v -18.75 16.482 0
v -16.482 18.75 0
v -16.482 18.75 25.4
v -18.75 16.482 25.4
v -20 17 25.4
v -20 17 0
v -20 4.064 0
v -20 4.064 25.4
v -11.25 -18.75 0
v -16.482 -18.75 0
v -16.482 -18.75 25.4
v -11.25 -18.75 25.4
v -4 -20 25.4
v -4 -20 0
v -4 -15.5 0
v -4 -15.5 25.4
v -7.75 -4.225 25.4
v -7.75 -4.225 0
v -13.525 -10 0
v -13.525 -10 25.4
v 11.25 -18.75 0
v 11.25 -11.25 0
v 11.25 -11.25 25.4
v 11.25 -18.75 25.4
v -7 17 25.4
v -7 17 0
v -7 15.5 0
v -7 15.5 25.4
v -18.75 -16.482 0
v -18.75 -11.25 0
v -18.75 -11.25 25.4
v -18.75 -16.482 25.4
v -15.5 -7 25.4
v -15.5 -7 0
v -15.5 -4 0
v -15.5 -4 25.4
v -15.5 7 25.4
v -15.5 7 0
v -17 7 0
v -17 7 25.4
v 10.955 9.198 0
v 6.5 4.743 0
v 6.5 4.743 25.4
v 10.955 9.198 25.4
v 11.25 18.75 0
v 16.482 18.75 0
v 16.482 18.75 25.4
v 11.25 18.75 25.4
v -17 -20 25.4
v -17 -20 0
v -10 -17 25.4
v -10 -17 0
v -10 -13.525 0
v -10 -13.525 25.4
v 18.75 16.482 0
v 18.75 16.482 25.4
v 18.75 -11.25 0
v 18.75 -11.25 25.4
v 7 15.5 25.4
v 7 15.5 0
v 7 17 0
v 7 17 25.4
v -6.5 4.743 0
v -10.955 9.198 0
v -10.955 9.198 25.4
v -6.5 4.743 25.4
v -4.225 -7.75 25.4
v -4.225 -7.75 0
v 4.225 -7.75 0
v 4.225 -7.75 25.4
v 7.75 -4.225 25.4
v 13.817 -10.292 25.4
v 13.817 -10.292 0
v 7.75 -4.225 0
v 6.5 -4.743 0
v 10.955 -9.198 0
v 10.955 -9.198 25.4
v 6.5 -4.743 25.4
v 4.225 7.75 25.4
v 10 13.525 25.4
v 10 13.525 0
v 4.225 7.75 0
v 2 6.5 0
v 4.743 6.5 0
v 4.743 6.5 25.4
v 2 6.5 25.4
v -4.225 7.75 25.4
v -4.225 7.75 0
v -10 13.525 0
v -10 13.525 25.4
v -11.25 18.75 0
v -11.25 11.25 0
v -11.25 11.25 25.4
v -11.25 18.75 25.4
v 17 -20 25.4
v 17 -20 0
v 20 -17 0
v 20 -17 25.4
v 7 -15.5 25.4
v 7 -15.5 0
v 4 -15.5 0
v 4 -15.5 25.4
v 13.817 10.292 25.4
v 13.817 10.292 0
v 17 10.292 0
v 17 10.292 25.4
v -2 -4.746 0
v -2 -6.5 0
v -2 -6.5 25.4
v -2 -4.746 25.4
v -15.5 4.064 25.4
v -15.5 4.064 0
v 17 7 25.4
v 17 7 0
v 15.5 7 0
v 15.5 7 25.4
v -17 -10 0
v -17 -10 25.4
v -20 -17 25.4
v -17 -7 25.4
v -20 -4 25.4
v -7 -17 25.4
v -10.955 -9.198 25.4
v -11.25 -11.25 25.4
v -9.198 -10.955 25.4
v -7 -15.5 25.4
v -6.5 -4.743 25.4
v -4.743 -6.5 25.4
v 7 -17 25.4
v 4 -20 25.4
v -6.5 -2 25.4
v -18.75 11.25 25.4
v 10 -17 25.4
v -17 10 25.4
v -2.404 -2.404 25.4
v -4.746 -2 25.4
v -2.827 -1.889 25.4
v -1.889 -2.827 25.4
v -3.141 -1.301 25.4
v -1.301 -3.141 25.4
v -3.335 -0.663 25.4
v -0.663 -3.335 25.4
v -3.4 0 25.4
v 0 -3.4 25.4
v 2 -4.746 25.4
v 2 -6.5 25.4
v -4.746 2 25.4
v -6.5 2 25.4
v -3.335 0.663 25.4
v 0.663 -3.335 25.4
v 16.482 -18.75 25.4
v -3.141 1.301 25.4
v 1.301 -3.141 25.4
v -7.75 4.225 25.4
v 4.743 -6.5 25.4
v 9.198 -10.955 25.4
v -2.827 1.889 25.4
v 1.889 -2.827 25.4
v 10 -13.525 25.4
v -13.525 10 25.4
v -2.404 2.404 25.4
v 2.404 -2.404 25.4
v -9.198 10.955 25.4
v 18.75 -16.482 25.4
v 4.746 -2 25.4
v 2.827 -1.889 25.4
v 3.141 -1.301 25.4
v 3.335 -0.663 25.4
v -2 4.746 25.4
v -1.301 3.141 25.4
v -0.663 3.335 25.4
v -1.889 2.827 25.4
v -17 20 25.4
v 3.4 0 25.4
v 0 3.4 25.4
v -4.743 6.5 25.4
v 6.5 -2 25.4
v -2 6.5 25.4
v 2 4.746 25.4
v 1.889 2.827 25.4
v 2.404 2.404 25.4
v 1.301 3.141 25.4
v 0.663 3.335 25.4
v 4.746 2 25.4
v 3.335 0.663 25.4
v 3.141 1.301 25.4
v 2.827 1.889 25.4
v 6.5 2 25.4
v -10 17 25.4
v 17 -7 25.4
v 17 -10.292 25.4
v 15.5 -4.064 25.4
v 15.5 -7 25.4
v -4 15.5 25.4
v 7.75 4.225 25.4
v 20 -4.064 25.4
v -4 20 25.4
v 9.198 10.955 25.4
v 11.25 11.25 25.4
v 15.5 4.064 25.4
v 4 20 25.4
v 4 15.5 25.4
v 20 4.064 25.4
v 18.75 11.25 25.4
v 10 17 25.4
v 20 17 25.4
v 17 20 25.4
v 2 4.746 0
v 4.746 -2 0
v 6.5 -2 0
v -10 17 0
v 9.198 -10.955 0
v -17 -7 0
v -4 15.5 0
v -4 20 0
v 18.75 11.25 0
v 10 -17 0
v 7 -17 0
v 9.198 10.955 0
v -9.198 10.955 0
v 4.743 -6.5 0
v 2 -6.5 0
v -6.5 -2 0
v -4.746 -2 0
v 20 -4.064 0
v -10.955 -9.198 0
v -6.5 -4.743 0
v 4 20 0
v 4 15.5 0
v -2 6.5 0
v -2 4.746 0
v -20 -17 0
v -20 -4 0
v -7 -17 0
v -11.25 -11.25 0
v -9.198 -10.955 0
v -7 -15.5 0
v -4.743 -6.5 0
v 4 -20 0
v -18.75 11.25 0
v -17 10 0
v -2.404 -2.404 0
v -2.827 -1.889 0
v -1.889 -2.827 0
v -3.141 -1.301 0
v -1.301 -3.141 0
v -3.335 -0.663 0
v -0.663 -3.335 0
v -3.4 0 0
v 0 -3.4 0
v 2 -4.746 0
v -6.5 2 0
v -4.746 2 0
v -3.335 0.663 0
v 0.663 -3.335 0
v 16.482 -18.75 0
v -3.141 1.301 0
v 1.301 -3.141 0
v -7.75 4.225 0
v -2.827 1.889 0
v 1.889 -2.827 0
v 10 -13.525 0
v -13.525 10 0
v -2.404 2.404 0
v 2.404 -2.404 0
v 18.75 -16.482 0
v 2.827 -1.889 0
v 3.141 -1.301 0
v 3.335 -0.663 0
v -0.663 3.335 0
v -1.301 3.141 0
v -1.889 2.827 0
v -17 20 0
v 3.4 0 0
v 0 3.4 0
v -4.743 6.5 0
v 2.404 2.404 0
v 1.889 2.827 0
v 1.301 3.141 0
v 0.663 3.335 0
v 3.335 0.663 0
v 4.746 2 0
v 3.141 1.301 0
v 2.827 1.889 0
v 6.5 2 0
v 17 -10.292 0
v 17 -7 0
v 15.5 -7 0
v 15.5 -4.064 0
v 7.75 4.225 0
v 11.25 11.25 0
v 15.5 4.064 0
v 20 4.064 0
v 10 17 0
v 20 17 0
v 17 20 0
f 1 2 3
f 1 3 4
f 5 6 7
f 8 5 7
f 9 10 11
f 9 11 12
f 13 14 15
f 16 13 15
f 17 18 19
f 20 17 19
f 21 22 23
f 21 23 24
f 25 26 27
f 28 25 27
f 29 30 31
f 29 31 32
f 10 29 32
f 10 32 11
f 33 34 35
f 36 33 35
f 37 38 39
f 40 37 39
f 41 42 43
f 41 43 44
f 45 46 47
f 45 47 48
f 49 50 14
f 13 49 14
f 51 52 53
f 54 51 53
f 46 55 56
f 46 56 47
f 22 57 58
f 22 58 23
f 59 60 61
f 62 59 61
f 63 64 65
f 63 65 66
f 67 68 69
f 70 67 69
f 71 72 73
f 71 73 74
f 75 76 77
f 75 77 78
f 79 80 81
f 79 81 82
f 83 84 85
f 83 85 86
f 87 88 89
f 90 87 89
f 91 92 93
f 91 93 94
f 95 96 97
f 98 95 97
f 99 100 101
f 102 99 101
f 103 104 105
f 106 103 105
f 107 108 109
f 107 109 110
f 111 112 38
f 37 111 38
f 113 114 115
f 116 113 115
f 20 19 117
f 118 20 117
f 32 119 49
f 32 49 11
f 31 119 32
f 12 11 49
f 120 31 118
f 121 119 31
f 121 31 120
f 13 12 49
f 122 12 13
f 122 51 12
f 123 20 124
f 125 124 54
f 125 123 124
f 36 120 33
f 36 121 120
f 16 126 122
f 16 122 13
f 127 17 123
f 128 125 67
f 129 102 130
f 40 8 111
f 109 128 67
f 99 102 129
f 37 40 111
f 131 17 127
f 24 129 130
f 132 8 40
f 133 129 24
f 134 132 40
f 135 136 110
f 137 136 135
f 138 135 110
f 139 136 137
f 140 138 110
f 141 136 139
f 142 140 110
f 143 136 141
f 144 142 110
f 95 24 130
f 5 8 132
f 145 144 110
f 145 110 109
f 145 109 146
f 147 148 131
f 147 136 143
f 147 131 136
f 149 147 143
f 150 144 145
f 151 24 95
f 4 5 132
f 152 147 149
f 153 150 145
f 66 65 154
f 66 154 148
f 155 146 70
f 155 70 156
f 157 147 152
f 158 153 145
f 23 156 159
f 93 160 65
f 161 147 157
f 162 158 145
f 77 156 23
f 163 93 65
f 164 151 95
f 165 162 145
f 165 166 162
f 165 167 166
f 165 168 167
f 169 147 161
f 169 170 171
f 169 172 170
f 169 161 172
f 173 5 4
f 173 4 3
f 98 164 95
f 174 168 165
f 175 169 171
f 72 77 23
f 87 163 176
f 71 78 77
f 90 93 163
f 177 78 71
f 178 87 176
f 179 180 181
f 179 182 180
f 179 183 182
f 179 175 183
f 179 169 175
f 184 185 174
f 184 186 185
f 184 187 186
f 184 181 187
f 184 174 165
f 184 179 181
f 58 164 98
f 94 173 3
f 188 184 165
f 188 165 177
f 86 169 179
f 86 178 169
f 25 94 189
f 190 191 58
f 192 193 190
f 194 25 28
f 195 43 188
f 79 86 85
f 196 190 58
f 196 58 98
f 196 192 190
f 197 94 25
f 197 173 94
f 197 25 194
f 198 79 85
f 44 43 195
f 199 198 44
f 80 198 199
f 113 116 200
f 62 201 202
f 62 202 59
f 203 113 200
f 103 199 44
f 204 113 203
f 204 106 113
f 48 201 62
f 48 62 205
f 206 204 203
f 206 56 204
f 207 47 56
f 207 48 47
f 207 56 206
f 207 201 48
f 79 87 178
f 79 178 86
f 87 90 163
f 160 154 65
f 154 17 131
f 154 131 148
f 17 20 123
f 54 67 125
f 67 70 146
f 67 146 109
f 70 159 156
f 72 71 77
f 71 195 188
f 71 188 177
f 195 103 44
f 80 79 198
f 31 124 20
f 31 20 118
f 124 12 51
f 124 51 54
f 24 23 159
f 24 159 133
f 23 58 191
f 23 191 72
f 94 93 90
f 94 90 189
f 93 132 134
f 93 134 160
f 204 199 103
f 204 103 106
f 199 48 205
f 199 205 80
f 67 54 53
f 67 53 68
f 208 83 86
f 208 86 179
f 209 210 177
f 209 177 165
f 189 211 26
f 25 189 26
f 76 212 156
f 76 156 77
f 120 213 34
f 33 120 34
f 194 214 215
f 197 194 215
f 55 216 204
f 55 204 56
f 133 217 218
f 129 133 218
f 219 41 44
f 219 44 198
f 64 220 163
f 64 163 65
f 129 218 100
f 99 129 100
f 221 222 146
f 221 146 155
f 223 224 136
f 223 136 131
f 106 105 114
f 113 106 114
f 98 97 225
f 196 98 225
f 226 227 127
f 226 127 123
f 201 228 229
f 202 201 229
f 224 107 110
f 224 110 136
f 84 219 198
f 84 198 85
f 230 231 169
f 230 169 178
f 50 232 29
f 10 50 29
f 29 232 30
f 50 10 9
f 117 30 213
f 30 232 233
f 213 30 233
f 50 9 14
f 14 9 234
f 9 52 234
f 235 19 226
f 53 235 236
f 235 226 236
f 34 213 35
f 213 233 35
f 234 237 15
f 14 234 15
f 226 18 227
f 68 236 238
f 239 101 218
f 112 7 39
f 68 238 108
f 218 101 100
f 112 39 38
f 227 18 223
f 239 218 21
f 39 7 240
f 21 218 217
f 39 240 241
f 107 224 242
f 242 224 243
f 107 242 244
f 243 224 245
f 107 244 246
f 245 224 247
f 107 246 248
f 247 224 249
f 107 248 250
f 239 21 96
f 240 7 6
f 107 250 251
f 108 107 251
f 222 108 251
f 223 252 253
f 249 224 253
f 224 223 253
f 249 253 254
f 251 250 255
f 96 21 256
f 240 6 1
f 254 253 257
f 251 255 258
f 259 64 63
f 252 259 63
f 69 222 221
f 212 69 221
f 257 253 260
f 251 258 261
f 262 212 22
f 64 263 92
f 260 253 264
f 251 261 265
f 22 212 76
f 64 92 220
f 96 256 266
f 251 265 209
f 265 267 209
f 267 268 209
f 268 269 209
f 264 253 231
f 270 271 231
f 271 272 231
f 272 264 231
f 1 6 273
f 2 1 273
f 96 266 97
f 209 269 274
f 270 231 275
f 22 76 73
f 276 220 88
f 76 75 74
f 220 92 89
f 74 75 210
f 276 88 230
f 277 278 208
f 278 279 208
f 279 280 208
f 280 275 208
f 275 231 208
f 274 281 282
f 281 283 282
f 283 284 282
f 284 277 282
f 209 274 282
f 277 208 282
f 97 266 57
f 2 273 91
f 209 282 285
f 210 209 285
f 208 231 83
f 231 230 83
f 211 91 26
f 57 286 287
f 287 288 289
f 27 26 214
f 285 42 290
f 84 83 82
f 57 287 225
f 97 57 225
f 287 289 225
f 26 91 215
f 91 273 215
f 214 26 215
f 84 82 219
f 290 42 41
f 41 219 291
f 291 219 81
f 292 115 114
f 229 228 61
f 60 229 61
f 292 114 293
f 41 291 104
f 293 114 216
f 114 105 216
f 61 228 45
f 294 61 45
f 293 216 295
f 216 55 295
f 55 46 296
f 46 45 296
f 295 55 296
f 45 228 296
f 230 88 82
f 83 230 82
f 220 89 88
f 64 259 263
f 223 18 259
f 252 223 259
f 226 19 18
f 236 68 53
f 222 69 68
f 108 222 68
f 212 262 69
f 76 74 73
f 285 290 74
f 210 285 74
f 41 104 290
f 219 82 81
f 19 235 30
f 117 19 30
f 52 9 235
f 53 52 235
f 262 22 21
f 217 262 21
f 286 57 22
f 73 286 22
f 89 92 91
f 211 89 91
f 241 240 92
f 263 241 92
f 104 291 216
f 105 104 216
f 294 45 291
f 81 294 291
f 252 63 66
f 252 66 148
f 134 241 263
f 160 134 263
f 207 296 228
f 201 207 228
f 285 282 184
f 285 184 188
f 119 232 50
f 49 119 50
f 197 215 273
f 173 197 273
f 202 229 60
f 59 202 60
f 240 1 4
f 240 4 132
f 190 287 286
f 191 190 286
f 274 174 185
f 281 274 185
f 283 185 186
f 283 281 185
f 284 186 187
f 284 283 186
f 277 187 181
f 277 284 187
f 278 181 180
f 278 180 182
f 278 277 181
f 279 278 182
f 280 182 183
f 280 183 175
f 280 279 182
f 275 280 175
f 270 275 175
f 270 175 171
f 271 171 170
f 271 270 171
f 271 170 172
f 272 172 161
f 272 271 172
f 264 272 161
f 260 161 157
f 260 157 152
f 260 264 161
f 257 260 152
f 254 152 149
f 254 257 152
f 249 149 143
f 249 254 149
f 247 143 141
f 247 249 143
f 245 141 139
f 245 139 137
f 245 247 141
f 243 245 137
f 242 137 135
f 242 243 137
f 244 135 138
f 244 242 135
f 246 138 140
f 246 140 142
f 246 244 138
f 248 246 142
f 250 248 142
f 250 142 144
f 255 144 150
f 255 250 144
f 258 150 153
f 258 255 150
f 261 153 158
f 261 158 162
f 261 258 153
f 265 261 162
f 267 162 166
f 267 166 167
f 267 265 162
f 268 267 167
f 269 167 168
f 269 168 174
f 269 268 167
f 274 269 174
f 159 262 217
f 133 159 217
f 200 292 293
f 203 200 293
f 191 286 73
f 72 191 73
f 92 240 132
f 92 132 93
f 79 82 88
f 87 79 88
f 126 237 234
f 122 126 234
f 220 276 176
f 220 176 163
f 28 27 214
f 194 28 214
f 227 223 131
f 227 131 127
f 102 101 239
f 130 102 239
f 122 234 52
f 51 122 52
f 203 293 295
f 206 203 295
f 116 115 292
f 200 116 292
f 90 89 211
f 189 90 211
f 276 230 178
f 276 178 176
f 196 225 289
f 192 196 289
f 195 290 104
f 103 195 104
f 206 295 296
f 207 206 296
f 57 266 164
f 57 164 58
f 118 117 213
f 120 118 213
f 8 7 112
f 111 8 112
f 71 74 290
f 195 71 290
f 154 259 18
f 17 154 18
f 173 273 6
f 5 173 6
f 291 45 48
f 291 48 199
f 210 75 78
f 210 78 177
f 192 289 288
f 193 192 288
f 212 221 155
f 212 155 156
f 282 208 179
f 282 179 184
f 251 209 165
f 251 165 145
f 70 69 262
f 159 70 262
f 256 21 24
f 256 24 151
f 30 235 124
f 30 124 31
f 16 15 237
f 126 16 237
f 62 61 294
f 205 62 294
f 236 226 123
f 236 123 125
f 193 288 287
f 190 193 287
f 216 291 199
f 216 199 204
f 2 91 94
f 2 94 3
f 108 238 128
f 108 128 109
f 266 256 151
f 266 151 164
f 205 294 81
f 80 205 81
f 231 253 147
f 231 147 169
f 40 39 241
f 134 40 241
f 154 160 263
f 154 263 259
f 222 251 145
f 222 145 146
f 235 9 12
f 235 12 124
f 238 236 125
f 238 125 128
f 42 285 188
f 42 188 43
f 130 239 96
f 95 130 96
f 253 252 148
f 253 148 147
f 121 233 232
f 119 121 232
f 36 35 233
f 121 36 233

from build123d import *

# Parameters (mm, degrees)
SKETCH1_R      = 3.4
EXTRUDE1_DEPTH = 25.4


with BuildPart() as part:
    # Sketch1 → Extrude1 (new body)
    with BuildSketch(Plane.XY):
        Polygon((4.225, 7.75), (-4.225, 7.75), (-10, 13.525), (-10, 17), (-7, 17), (-7, 15.5), (-4, 15.5), (-4, 20), (-17, 20), (-20, 17), (-20, 4.0635), (-15.5, 4.0635), (-15.5, 7), (-17, 7), (-17, 10), (-13.525, 10), (-7.75, 4.225), (-7.75, -4.225), (-13.525, -10), (-17, -10), (-17, -7), (-15.5, -7), (-15.5, -4), (-20, -4), (-20, -17), (-17, -20), (-4, -20), (-4, -15.5), (-7, -15.5), (-7, -17), (-10, -17), (-10, -13.525), (-4.225, -7.75), (4.225, -7.75), (10, -13.525), (10, -17), (7, -17), (7, -15.5), (4, -15.5), (4, -20), (17, -20), (20, -17), (20, -4.0635), (15.5, -4.0635), (15.5, -7), (17, -7), (17, -10.2921), (13.8171, -10.2921), (7.75, -4.225), (7.75, 4.225), (13.8171, 10.2921), (17, 10.2921), (17, 7), (15.5, 7), (15.5, 4.0635), (20, 4.0635), (20, 17), (17, 20), (4, 20), (4, 15.5), (7, 15.5), (7, 17), (10, 17), (10, 13.525), align=None)
        Circle(SKETCH1_R, mode=Mode.SUBTRACT)
        Polygon((-18.75, -16.482233), (-16.482233, -18.75), (-11.25, -18.75), (-11.25, -11.25), (-18.75, -11.25), align=None, mode=Mode.SUBTRACT)
        Polygon((18.75, 16.482233), (16.482233, 18.75), (11.25, 18.75), (11.25, 11.25), (18.75, 11.25), align=None, mode=Mode.SUBTRACT)
        Polygon((2, -6.5), (4.742767, -6.5), (9.197655, -10.954888), (10.954888, -9.197655), (6.5, -4.742767), (6.5, -2), (4.745788, -2), (2, -4.745788), align=None, mode=Mode.SUBTRACT)
        Polygon((6.5, 2), (6.5, 4.742767), (10.954888, 9.197655), (9.197655, 10.954888), (4.742767, 6.5), (2, 6.5), (2, 4.745788), (4.745788, 2), align=None, mode=Mode.SUBTRACT)
        Polygon((-2, 6.5), (-4.742767, 6.5), (-9.197655, 10.954888), (-10.954888, 9.197655), (-6.5, 4.742767), (-6.5, 2), (-4.745788, 2), (-2, 4.745788), align=None, mode=Mode.SUBTRACT)
        Polygon((-6.5, -2), (-6.5, -4.742767), (-10.954888, -9.197655), (-9.197655, -10.954888), (-4.742767, -6.5), (-2, -6.5), (-2, -4.745788), (-4.745788, -2), align=None, mode=Mode.SUBTRACT)
        Polygon((-16.482233, 18.75), (-18.75, 16.482233), (-18.75, 11.25), (-11.25, 11.25), (-11.25, 18.75), align=None, mode=Mode.SUBTRACT)
        Polygon((16.482233, -18.75), (18.75, -16.482233), (18.75, -11.25), (11.25, -11.25), (11.25, -18.75), align=None, mode=Mode.SUBTRACT)
    extrude(amount=EXTRUDE1_DEPTH)


solid = part.part
